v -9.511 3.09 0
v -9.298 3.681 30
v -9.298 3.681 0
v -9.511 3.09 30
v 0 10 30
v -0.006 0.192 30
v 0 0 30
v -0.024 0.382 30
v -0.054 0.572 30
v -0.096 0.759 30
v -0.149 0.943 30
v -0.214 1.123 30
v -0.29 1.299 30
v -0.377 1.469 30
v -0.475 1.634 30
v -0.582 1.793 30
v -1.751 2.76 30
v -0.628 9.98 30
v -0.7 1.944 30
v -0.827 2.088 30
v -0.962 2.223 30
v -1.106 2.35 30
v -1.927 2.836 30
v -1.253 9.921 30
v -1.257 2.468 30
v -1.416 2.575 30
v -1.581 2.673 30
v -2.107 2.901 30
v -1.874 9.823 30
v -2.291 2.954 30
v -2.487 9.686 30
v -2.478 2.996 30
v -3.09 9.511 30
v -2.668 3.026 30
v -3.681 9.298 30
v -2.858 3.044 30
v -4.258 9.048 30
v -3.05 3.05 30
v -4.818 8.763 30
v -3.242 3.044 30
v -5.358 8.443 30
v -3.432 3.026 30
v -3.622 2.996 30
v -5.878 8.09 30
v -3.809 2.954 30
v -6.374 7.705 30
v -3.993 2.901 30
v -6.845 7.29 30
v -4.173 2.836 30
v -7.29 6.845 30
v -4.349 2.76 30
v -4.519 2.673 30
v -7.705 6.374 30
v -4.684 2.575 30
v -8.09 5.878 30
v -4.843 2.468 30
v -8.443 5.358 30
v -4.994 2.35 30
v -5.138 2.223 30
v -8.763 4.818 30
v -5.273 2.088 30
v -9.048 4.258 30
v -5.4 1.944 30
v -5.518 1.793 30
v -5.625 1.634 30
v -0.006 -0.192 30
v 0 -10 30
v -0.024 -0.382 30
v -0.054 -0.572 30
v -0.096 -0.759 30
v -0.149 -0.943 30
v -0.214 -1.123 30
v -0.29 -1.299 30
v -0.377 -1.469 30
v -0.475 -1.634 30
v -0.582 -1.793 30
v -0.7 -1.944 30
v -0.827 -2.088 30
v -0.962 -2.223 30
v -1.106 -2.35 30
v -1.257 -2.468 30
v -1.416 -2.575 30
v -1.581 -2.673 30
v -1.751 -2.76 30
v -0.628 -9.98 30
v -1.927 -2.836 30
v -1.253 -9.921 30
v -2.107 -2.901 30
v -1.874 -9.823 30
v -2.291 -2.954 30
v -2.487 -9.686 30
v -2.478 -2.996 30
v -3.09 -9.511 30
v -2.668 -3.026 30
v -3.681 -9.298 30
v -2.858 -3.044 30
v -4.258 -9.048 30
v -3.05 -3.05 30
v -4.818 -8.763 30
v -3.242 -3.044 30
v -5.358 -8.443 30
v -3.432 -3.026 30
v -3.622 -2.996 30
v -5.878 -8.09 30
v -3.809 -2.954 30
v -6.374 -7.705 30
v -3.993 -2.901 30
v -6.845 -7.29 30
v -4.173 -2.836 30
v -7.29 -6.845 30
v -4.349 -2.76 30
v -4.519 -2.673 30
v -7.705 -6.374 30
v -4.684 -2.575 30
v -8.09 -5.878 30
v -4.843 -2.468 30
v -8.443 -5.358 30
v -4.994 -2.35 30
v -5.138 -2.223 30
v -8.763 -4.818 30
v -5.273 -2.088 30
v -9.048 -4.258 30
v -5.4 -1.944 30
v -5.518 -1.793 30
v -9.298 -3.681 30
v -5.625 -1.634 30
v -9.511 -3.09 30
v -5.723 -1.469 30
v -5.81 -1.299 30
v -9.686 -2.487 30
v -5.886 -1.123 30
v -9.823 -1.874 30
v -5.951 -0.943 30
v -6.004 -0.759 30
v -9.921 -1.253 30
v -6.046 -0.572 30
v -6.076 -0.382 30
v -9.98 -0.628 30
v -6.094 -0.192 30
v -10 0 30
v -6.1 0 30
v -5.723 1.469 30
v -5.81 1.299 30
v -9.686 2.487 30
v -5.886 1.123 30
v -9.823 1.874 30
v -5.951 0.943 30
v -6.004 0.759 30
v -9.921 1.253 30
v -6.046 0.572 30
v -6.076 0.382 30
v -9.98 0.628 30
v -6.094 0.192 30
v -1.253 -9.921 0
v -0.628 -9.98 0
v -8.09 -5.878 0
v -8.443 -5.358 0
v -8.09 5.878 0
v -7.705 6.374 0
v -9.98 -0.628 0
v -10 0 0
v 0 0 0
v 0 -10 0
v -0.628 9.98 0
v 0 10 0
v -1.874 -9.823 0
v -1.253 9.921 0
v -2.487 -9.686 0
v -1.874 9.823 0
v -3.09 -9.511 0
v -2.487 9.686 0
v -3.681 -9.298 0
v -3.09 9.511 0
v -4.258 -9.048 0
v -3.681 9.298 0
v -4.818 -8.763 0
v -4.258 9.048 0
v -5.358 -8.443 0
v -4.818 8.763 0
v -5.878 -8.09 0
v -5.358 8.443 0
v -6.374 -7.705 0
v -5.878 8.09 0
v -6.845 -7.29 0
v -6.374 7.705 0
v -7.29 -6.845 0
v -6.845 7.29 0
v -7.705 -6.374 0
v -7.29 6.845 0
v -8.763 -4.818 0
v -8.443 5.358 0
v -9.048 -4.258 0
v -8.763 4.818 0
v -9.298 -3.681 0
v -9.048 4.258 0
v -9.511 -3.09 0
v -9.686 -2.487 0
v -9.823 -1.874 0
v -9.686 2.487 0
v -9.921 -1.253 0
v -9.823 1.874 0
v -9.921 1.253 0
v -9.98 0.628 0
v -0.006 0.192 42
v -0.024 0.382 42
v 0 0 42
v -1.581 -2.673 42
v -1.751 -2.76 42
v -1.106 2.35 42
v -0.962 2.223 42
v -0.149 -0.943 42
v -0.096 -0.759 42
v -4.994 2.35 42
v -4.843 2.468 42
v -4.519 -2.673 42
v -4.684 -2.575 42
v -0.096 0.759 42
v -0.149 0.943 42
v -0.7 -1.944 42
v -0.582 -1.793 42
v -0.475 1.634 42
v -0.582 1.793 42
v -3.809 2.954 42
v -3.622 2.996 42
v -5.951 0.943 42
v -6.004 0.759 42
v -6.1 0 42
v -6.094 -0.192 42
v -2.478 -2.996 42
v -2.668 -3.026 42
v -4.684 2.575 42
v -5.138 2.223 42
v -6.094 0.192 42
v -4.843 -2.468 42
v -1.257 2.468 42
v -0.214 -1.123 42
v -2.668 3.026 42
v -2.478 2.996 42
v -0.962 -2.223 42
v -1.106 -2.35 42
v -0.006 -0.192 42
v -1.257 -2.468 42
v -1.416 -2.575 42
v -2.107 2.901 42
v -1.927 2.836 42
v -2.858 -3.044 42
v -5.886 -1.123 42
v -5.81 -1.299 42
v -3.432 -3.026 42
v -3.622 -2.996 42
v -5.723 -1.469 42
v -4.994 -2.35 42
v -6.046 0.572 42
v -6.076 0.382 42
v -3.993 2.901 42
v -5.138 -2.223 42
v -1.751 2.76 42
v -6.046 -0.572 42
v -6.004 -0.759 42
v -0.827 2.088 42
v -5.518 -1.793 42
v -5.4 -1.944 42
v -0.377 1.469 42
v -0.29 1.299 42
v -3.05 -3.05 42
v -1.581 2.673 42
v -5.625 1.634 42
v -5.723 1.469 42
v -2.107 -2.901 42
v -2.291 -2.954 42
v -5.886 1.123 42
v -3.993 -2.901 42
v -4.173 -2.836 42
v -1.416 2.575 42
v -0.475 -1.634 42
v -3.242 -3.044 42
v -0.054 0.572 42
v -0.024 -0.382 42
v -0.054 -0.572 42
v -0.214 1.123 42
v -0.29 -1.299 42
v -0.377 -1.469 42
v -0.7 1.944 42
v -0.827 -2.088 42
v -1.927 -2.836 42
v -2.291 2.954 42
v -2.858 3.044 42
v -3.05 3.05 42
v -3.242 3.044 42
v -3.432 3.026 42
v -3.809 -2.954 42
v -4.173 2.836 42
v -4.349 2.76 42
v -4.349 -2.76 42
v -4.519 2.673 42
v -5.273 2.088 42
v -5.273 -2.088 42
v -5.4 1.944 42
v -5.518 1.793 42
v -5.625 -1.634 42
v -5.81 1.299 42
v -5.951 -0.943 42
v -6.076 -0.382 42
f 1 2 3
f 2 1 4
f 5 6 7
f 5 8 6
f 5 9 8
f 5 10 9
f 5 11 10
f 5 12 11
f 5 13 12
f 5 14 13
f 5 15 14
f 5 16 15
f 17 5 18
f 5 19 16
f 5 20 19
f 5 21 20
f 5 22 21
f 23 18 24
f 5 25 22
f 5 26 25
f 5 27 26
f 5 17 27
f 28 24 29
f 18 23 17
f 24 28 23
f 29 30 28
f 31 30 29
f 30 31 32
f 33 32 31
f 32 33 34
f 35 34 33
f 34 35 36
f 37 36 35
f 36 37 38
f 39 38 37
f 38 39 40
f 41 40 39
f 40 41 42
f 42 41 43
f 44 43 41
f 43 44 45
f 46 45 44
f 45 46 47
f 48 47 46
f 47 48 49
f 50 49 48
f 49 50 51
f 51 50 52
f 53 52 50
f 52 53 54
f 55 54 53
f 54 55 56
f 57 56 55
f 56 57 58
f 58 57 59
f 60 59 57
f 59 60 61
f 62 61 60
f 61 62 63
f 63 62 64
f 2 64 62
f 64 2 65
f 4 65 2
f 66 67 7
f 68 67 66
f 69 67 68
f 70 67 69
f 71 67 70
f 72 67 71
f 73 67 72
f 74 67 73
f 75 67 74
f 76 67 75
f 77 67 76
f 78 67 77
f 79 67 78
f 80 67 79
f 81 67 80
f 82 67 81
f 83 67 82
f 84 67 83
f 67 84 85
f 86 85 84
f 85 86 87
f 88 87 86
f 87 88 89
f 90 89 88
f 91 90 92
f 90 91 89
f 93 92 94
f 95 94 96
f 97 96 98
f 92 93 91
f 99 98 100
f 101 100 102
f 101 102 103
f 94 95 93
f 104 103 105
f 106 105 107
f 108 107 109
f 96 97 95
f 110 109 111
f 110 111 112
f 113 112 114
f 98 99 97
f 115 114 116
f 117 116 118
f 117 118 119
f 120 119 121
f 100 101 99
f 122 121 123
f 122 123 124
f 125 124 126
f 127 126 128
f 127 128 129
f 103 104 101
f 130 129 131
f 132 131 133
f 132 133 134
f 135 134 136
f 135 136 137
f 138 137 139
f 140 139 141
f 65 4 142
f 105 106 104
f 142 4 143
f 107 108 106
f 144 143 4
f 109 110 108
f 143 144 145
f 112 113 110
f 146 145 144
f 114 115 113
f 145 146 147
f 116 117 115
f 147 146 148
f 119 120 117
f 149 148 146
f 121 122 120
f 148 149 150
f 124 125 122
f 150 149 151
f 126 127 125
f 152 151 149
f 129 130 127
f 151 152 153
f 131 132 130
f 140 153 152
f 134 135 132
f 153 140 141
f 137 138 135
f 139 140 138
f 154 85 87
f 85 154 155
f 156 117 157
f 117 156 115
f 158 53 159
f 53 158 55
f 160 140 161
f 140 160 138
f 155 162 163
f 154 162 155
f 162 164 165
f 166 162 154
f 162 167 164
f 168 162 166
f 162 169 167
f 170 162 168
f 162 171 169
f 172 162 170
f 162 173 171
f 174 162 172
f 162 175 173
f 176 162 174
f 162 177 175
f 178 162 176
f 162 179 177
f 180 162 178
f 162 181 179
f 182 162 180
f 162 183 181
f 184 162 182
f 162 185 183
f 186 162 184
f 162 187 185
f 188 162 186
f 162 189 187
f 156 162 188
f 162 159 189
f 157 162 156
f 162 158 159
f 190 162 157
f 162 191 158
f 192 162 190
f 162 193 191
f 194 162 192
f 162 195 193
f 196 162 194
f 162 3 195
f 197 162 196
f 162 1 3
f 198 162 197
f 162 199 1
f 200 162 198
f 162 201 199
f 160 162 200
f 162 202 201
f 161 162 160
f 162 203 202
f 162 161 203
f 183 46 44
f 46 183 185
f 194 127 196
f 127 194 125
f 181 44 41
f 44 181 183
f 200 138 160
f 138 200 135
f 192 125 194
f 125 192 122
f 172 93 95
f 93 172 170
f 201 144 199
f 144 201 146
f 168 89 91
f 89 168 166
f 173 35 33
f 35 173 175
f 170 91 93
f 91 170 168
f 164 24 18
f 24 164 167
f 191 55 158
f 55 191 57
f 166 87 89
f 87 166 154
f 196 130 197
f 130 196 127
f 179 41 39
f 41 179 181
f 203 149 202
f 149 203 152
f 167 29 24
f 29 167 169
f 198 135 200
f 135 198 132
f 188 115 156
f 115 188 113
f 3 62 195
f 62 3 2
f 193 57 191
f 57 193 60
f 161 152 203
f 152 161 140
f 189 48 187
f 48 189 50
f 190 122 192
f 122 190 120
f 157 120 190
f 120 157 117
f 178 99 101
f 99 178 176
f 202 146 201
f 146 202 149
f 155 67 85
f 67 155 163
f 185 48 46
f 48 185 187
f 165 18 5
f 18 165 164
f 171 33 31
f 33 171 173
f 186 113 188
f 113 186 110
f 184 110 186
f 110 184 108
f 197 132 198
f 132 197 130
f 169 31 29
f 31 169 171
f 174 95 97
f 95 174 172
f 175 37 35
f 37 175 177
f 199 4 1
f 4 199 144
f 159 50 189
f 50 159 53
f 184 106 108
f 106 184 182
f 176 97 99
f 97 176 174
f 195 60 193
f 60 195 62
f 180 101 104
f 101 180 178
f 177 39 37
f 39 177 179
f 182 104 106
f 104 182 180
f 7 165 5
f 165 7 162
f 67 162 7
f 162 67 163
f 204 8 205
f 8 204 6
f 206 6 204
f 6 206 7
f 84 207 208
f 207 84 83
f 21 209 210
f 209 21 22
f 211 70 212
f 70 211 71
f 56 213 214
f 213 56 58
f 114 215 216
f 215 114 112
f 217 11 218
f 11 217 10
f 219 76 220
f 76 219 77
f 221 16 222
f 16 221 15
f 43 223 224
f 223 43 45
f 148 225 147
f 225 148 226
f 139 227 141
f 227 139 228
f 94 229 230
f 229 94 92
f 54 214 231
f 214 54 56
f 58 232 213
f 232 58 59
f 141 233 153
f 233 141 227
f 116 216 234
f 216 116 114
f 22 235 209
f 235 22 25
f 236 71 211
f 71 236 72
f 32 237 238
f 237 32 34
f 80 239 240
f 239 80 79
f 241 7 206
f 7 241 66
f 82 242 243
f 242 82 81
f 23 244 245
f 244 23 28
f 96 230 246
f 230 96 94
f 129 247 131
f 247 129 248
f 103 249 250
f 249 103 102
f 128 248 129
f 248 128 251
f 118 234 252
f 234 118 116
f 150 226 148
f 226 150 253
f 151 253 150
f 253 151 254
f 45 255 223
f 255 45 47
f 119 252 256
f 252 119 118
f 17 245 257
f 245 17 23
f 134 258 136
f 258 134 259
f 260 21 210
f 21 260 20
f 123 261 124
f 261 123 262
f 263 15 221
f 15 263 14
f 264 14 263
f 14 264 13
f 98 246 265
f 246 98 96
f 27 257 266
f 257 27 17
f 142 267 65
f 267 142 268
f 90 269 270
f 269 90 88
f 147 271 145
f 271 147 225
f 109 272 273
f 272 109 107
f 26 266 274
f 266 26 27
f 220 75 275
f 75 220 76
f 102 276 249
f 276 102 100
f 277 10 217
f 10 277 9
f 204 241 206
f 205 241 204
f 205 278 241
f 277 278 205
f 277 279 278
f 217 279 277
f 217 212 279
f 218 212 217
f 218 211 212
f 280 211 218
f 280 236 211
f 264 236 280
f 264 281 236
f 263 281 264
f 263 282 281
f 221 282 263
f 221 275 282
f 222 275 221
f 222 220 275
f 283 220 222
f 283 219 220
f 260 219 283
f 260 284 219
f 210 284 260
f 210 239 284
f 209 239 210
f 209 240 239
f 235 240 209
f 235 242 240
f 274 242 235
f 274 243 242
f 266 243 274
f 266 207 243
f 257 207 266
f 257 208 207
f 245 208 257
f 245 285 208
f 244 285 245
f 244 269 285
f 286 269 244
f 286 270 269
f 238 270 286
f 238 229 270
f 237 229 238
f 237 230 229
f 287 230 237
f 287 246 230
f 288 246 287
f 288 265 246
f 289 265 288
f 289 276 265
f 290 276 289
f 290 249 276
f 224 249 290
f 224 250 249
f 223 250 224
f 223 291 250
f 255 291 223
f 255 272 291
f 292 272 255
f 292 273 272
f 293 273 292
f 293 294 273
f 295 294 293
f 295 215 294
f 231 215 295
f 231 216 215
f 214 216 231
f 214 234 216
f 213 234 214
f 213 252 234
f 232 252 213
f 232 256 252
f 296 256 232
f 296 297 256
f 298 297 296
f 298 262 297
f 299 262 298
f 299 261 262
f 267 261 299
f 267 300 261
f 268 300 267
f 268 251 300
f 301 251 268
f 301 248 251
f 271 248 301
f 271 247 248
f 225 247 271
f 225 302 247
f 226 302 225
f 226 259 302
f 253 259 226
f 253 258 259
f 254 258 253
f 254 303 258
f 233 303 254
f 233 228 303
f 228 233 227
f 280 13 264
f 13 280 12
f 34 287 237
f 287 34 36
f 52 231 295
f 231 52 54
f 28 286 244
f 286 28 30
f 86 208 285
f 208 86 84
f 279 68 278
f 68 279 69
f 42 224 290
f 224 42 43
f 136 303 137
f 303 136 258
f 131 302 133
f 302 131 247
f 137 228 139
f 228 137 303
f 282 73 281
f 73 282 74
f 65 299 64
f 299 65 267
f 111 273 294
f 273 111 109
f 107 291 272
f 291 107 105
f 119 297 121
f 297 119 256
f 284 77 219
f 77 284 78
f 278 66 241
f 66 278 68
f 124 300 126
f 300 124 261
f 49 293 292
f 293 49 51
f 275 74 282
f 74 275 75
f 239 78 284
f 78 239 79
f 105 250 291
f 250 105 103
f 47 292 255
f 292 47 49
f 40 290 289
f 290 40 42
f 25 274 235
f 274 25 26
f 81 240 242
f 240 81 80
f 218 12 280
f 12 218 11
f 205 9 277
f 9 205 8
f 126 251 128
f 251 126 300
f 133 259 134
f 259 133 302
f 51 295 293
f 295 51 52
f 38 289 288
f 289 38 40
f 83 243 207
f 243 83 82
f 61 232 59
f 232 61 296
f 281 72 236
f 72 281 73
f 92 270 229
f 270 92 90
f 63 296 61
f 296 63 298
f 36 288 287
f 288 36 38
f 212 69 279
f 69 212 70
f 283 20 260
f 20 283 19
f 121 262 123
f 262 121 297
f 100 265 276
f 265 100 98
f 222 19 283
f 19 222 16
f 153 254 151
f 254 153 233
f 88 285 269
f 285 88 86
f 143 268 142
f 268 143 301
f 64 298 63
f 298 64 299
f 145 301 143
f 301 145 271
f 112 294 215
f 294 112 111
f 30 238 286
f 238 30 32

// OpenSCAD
// This makes a simple shelf holder made up of a spoke that fits into a drill hole and a tab that holds up a shelf.

//radius of spoke in mm
rad=3.05;
//height of spoke in mm
hs=12;
//radius of tab
rt=10;
// height of tab in mm
ht=30;
$fn=100;

union(){
    translate([-rad,0,0])cylinder(r=rad,h=hs+ht);
    difference(){
    cylinder(r=rt, h=ht);
    translate([0,-rt,-1])cube([2*rt+2,2*rt+2,hs+ht]);
}
}
